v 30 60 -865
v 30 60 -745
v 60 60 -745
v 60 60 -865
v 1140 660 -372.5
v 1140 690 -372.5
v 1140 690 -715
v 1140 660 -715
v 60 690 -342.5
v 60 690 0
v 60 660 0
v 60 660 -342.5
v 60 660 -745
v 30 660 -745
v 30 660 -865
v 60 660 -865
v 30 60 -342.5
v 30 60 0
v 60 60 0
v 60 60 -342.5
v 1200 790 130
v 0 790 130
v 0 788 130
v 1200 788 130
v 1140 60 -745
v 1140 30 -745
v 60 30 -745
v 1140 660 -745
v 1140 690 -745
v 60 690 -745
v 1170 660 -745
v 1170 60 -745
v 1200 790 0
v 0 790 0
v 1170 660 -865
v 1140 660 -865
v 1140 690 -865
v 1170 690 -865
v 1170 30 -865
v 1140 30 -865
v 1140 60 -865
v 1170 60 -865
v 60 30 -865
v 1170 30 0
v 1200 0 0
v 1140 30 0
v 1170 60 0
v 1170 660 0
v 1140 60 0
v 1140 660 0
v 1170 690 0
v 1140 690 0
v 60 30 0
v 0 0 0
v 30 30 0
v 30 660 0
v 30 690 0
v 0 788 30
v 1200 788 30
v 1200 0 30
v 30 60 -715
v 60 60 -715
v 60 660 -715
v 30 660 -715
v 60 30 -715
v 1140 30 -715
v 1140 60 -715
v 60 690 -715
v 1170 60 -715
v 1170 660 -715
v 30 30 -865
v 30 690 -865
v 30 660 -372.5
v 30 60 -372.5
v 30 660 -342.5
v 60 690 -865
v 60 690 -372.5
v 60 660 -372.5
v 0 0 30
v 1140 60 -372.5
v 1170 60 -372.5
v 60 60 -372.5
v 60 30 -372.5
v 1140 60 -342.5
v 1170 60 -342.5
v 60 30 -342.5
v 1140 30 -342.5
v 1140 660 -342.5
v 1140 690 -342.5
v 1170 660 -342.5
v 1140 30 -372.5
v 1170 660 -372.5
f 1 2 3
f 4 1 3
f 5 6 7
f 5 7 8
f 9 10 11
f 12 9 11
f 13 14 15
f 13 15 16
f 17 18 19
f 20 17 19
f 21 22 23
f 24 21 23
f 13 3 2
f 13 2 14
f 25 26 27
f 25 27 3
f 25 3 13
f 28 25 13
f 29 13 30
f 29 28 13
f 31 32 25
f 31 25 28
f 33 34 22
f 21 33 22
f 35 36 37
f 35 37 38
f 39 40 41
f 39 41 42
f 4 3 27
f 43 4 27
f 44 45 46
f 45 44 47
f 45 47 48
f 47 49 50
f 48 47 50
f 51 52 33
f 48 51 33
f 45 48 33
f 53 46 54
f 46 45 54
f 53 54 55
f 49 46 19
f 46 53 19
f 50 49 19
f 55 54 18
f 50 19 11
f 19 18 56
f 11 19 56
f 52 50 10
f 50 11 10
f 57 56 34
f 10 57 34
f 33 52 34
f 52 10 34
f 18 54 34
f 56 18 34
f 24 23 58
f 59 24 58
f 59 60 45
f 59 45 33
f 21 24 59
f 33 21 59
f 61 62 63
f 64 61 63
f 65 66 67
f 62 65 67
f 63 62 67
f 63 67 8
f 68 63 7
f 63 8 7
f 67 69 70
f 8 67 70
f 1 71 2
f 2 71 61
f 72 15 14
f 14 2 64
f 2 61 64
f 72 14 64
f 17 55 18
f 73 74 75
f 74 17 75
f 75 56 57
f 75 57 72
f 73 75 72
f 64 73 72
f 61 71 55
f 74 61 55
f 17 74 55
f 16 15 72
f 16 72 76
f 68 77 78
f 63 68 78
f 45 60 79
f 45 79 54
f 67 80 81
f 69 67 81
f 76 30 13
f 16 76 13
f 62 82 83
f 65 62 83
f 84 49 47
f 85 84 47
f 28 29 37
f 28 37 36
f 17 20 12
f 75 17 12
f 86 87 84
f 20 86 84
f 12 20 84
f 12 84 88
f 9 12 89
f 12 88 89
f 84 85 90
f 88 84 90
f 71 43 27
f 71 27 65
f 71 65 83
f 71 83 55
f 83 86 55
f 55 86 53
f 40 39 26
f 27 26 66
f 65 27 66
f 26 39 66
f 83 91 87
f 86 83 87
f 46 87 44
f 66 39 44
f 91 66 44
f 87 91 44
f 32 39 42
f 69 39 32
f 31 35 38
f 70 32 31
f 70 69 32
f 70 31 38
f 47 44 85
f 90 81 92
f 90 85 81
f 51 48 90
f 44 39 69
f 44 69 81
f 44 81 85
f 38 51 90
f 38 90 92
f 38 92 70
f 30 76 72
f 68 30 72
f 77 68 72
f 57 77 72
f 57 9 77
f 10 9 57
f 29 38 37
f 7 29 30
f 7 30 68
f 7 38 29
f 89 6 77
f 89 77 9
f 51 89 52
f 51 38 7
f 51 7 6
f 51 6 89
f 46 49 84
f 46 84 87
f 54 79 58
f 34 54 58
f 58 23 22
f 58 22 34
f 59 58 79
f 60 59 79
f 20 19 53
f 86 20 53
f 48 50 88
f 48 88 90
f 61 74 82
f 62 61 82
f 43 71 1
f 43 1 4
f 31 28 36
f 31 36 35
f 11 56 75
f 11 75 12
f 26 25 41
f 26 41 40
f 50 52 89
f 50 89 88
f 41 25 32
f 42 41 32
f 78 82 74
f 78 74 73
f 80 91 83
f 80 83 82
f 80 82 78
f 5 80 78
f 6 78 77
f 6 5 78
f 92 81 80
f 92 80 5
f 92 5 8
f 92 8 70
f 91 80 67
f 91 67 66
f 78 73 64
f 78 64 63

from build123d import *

# Parameters (mm, degrees)
F1_DEPTH      = 1200
F2_W          = 30
F2_H          = 30
F3_DEPTH      = 865
F5_W          = 660
F5_H          = 30
F6_DEPTH      = 1085
F6_DEPTH_BACK = 55
F7_W          = 660
F7_H          = 30
F8_DEPTH      = 1085
F8_DEPTH_BACK = 55


with BuildPart() as f1:
    # F0 (on Right) → F1 (new body)
    with BuildSketch(Plane.YZ):
        Polygon((0, 30), (0, 0), (790, 0), (790, 130), (788, 130), (788, 30), align=None)
    extrude(amount=F1_DEPTH)

    # F2 (on face) → F3 (join)
    with BuildSketch(Plane(origin=(0, 0, 0), x_dir=(1, 0, 0), z_dir=(0, 0, -1))):
        with Locations((45, -45)):
            Rectangle(F2_W, F2_H)
        with Locations((1155, -45)):
            Rectangle(F2_W, F2_H)
        with Locations((1155, -675)):
            Rectangle(F2_W, F2_H)
        with Locations((45, -675)):
            Rectangle(F2_W, F2_H)
    extrude(amount=F3_DEPTH)

    # F5 (on offset) → F6 (join, two sides)
    with BuildSketch(Plane.YZ.offset(85)) as f6_sk:
        with Locations((360, -730)):
            Rectangle(F5_W, F5_H)
    extrude(amount=F6_DEPTH)
    extrude(f6_sk.sketch, amount=-F6_DEPTH_BACK)

    # F7 (on offset) → F8 (join, two sides)
    with BuildSketch(Plane.YZ.offset(85)) as f8_sk:
        with Locations((360, -357.5)):
            Rectangle(F7_W, F7_H)
    extrude(amount=F8_DEPTH)
    extrude(f8_sk.sketch, amount=-F8_DEPTH_BACK)


solid = f1.part
